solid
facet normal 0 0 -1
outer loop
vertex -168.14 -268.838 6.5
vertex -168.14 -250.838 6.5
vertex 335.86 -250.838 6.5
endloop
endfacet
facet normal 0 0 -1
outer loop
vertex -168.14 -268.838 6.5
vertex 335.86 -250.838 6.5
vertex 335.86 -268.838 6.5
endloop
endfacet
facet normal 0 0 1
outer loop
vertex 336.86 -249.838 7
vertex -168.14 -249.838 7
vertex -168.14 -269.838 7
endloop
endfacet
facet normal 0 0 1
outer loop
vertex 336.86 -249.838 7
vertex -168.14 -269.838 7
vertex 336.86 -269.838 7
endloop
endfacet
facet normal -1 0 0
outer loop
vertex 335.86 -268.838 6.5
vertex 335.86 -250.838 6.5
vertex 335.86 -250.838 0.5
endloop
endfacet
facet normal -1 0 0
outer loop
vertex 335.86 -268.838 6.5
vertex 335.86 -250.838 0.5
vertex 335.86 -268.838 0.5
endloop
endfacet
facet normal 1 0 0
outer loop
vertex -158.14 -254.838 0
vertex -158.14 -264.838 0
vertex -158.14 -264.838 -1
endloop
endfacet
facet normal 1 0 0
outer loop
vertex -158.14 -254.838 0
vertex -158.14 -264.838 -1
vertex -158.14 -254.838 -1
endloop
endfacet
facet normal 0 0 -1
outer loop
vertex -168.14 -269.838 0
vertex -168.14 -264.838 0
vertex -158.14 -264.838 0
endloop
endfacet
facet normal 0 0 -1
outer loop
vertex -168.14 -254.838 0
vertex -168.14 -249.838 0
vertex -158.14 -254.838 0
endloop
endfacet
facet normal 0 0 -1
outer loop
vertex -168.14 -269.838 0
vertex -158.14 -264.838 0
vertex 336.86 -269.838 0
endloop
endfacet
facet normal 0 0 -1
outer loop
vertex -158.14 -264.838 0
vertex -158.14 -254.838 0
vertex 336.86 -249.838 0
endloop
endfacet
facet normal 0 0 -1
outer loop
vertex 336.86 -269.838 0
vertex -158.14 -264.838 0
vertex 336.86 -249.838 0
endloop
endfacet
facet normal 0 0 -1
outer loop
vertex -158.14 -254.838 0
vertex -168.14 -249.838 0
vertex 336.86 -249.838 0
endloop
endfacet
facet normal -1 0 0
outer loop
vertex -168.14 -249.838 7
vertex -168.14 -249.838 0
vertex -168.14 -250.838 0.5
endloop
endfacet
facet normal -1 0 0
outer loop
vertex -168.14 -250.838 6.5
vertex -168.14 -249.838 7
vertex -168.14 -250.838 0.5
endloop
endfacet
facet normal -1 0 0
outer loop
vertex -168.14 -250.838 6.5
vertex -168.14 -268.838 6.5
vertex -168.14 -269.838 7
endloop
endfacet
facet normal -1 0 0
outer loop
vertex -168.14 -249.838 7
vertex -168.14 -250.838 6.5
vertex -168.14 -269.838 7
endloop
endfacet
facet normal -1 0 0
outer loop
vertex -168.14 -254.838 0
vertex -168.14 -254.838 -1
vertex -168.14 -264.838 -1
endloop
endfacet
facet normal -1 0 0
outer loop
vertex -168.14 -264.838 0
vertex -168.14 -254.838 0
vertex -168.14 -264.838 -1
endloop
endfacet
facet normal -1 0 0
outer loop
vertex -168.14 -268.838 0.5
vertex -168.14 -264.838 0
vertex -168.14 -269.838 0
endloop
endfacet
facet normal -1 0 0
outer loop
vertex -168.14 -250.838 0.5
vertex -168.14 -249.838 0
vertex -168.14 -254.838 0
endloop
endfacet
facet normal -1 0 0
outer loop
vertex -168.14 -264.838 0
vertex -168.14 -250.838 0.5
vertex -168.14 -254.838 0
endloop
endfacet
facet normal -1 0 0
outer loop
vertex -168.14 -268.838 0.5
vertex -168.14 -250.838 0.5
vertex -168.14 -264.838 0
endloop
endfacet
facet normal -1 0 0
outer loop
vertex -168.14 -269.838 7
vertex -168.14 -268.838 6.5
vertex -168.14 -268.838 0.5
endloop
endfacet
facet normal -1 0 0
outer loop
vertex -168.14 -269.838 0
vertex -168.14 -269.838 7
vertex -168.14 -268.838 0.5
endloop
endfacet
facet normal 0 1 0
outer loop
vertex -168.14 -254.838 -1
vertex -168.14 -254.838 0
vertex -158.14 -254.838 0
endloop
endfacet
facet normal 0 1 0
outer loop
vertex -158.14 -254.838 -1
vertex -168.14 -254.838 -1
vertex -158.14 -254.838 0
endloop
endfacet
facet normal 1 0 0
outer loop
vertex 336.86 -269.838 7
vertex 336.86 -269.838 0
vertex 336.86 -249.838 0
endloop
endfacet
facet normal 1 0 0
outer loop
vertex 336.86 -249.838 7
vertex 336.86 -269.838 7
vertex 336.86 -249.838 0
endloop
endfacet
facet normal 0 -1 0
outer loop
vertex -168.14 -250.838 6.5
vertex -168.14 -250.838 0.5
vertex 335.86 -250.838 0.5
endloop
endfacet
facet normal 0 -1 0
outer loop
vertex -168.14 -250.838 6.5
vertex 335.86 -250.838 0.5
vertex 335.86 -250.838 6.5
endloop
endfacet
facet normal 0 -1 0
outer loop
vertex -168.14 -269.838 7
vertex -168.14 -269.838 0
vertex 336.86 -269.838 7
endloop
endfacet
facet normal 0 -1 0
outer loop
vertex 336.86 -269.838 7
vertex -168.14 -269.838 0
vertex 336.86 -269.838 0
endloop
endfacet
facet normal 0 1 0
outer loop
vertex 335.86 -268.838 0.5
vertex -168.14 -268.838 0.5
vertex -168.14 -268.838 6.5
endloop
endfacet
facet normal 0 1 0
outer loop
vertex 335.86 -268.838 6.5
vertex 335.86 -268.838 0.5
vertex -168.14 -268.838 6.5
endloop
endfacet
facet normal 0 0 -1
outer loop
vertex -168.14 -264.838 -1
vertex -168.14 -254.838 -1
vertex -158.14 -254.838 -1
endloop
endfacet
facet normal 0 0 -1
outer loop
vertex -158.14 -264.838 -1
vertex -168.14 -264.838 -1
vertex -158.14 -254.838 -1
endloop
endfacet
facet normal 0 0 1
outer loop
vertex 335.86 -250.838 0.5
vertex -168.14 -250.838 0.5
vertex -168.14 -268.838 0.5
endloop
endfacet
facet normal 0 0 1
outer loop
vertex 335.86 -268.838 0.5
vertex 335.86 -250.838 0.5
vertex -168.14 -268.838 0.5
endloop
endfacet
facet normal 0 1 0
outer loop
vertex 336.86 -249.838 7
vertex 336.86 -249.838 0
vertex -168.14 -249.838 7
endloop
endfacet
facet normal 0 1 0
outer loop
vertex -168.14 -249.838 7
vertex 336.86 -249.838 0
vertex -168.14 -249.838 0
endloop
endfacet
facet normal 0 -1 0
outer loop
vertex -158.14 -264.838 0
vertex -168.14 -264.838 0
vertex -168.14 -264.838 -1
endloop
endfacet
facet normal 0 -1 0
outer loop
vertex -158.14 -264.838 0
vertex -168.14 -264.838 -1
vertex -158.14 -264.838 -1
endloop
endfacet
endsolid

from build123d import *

# Parameters (mm, degrees)
F0_W     = 10
F0_H     = 10
F1_DEPTH = 7
F2_DEPTH = 1
F3_W     = 18
F3_H     = 6
F4_DEPTH = 504


with BuildPart() as f1:
    # F0 (on Top) → F1 (new body)
    with BuildSketch(Plane.XY):
        Polygon((336.860095, -249.837965), (-168.139905, -249.837965), (-168.139905, -254.837965), (-158.139905, -254.837965), (-158.139905, -264.837965), (-168.139905, -264.837965), (-168.139905, -269.837965), (336.860095, -269.837965), align=None)
        with Locations((-163.139905, -259.837965)):
            Rectangle(F0_W, F0_H)
    extrude(amount=F1_DEPTH)

    # F0 (on Top) → F2 (join)
    with BuildSketch(Plane.XY):
        with Locations((-163.139905, -259.837965)):
            Rectangle(F0_W, F0_H)
    extrude(amount=-F2_DEPTH)

    # F3 (on face) → F4 (cut)
    with BuildSketch(Plane(origin=(-168.139905, 0, 0), x_dir=(0, -1, 0), z_dir=(-1, 0, 0))):
        with Locations((259.837965, 3.5)):
            Rectangle(F3_W, F3_H)
    extrude(amount=-F4_DEPTH, mode=Mode.SUBTRACT)


solid = f1.part
